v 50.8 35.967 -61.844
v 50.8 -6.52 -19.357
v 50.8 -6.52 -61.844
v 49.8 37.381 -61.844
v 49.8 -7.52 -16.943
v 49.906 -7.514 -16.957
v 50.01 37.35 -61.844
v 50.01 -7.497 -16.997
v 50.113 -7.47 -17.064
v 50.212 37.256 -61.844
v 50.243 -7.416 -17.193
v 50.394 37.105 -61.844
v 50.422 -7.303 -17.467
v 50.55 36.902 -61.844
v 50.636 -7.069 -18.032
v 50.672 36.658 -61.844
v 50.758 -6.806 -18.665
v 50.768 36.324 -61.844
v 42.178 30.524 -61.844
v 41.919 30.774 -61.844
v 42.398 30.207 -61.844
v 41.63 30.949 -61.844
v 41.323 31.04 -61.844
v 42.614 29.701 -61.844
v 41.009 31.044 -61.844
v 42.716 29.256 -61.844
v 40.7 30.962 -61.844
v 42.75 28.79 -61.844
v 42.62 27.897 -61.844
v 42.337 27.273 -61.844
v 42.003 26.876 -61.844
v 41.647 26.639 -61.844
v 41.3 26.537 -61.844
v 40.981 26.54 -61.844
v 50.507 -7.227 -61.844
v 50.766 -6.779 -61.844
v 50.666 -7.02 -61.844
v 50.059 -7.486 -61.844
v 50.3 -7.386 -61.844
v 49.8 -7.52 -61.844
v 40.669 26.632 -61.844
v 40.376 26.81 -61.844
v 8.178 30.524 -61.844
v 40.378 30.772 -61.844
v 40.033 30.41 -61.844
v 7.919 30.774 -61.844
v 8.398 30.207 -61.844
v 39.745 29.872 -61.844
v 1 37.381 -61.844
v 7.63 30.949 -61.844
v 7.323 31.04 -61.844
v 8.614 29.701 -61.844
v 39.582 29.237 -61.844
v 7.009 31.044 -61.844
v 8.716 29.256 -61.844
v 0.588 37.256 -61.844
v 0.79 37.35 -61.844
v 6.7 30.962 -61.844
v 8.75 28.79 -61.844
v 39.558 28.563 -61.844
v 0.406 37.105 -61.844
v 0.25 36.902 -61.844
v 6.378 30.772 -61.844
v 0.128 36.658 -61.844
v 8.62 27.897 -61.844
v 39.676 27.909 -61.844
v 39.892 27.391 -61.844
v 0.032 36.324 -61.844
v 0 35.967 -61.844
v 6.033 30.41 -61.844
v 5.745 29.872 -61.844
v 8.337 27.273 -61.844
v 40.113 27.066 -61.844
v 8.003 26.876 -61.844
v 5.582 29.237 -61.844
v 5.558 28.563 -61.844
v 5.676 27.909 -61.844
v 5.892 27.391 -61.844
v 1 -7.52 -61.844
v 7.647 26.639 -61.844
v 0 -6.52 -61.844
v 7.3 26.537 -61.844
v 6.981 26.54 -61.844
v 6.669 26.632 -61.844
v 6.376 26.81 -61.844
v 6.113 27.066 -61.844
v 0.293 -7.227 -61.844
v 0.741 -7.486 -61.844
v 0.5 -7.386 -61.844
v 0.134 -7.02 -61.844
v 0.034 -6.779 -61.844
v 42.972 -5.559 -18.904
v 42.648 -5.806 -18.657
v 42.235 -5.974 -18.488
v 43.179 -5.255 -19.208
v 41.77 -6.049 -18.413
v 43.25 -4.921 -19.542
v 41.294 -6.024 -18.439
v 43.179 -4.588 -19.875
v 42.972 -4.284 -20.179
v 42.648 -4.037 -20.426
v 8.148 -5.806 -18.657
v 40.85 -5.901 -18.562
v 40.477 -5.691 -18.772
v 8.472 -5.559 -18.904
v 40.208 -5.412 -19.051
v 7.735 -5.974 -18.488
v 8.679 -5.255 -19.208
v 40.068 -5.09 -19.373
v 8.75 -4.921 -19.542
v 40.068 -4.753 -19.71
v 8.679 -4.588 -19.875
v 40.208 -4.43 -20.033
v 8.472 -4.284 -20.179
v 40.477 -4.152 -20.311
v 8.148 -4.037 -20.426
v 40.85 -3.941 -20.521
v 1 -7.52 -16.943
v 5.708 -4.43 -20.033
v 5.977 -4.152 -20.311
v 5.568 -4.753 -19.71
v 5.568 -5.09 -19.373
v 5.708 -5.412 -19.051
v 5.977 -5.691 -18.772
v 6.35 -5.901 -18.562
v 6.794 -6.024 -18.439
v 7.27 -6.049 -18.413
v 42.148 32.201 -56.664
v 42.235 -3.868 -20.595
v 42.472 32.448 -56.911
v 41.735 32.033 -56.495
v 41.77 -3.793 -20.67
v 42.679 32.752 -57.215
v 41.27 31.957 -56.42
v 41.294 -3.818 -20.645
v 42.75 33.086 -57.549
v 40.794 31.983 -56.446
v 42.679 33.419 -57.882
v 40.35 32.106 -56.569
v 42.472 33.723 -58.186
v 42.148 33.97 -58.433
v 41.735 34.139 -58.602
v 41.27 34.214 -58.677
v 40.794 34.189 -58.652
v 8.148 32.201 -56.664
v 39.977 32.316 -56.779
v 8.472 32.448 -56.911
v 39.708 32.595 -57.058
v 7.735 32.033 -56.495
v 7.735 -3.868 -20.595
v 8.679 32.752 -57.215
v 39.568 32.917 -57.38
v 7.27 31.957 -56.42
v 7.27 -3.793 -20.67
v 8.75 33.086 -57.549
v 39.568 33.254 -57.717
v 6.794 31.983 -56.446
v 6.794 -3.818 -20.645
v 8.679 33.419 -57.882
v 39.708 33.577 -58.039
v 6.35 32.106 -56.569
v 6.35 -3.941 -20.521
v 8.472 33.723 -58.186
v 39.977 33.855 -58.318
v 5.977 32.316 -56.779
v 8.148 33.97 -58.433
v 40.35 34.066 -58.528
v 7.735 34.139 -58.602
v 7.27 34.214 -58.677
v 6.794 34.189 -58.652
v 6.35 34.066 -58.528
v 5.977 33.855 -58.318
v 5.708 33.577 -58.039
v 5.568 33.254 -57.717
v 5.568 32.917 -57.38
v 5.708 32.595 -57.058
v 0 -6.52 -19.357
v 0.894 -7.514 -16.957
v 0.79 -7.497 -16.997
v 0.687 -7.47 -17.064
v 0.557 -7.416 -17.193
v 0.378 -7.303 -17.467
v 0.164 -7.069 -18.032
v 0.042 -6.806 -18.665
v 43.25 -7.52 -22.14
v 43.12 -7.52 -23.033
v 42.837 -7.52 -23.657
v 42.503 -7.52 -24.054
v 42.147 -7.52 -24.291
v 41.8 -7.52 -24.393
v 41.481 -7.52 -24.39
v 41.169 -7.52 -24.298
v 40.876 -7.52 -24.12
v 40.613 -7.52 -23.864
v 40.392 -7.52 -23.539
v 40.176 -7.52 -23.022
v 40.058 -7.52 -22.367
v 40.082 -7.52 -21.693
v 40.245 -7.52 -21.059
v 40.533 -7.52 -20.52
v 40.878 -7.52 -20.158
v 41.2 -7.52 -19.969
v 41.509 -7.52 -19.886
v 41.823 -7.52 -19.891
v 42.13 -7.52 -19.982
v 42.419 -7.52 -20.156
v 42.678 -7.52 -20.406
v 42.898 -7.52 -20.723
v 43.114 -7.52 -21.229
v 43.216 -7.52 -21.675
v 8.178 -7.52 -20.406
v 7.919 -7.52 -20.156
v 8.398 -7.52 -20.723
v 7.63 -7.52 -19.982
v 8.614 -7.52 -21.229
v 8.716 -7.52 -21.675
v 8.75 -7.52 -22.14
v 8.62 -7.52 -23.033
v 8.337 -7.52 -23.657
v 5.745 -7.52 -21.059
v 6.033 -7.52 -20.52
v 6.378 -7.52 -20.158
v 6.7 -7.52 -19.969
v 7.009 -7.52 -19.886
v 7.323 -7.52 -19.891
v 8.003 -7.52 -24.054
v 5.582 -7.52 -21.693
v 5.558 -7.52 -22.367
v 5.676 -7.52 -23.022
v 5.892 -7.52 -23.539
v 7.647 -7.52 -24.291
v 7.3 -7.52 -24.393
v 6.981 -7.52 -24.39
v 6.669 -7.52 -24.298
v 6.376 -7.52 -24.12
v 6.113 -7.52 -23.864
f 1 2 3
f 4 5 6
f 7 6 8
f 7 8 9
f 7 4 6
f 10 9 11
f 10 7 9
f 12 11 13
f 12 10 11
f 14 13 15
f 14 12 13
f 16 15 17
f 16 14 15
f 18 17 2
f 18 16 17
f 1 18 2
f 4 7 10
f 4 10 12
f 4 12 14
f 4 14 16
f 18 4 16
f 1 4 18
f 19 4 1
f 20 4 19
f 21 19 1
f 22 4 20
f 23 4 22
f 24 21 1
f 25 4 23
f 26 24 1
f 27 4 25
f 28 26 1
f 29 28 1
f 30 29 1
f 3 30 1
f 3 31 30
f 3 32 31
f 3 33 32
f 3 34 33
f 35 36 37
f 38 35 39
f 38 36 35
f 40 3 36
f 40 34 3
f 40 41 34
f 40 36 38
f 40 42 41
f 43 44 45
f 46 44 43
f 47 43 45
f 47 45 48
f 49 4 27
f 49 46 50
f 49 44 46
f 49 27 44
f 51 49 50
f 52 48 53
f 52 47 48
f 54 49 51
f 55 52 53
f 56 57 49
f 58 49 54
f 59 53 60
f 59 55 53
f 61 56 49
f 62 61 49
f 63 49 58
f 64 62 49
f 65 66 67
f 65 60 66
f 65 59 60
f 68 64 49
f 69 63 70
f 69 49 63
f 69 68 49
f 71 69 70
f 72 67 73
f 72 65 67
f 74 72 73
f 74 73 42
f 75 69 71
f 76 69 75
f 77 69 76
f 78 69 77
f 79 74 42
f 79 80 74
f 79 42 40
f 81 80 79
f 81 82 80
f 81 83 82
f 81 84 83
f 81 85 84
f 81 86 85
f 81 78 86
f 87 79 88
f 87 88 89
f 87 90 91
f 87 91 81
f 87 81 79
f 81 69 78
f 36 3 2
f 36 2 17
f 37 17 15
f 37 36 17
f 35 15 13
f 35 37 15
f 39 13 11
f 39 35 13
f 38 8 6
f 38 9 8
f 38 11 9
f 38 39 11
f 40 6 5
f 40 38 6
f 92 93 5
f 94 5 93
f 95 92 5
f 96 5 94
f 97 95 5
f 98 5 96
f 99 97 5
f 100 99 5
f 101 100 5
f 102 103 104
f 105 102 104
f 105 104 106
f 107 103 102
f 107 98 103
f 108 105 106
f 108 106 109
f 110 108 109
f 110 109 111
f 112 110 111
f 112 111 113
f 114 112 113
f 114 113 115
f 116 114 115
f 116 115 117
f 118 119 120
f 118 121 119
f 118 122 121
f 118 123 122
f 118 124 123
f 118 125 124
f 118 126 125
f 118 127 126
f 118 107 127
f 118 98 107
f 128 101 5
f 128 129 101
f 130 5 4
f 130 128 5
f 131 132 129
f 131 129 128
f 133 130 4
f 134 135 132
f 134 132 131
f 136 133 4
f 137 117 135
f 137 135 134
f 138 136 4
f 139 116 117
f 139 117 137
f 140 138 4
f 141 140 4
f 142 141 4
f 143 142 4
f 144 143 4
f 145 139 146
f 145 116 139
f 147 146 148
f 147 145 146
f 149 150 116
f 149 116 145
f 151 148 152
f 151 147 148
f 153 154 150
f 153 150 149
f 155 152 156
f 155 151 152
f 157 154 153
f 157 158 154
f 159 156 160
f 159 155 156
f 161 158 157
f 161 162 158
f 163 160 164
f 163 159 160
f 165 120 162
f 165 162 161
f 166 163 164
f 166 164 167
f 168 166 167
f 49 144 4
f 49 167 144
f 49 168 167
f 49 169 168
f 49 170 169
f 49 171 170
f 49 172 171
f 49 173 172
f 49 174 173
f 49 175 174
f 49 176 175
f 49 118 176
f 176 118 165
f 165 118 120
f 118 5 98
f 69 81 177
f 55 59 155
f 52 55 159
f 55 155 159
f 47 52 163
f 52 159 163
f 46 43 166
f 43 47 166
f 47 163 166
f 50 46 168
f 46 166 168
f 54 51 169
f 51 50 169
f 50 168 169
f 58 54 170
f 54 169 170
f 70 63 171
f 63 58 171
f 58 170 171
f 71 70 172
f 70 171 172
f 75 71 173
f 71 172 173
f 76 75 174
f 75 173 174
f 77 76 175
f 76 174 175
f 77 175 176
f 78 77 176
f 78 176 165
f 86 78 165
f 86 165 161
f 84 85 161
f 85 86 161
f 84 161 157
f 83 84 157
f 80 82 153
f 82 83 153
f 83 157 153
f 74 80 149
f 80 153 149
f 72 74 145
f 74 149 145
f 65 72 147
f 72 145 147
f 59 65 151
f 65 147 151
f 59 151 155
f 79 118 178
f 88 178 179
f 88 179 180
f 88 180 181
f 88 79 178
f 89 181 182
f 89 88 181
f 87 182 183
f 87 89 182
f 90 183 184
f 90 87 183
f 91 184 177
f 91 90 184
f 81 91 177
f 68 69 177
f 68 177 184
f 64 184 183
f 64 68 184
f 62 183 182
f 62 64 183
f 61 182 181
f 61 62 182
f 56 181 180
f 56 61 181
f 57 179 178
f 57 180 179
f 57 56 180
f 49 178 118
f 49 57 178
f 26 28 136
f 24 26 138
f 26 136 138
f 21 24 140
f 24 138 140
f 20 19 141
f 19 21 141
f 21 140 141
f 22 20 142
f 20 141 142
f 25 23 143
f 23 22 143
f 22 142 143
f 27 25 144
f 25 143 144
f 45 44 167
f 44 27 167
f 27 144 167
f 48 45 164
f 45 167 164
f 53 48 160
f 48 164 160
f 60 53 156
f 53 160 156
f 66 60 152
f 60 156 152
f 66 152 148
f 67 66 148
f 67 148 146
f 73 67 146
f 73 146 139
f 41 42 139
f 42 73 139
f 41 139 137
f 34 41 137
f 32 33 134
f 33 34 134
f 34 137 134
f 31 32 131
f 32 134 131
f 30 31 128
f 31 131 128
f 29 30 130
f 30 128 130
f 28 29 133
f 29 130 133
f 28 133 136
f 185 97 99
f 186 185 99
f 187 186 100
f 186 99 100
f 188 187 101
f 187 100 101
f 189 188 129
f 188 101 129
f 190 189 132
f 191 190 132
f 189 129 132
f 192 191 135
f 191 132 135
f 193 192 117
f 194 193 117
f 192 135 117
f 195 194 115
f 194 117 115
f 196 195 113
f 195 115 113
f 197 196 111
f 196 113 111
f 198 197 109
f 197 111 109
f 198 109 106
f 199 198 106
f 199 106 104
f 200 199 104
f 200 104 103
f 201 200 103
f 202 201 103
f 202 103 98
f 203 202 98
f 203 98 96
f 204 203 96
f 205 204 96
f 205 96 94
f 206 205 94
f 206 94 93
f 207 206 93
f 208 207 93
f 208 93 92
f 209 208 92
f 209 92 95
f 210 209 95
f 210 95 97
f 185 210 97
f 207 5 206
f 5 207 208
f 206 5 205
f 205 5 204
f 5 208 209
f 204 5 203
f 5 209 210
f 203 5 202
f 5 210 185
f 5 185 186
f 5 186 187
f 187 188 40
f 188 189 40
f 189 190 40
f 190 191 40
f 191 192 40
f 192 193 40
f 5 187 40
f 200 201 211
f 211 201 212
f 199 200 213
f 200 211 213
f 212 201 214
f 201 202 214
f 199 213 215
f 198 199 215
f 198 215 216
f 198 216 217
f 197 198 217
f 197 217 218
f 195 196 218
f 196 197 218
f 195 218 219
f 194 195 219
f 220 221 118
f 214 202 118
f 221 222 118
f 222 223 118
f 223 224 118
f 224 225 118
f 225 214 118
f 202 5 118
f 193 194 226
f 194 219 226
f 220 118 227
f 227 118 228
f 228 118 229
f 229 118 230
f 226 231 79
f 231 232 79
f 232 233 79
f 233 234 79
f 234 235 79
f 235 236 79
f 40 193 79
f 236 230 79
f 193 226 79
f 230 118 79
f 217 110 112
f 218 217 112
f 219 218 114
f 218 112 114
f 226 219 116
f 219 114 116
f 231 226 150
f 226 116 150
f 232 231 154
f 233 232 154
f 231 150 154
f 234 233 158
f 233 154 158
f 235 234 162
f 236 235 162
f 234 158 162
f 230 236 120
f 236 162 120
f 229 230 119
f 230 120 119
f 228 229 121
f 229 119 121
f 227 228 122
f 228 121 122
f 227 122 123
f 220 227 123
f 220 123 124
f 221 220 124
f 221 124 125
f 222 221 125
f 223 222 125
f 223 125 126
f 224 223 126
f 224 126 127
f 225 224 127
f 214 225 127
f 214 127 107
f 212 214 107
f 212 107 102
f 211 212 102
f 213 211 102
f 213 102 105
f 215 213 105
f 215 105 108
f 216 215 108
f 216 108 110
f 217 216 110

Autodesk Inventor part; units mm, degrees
ref_plane "YZ Plane" through (0, 0, 0) normal (1, 0, 0) x (0, 1, 0)
ref_plane "XZ Plane" through (0, 0, 0) normal (0, 1, 0) x (-1, 0, 0)
ref_plane "XY Plane" through (0, 0, 0) normal (0, 0, 1) x (1, 0, 0)
sketch "Sketch2" plane through (0, 0, 0) normal (1, 0, 0) x (0, 1, 0)
  line L0 (-7.5199, -16.943) -> (37.3814, -61.8443)
  line L1 (37.3814, -61.8443) -> (-7.5199, -61.8443)
  line L2 (-7.5199, -16.943) -> (-7.5199, -61.8443)
  point P0 (0, 0)
  dimension "d0" = 63.5
  dimension "d3" = 45
extrude "Extrusion1" add sketch "Sketch2" along normal blind 50.8
sketch "Sketch4" plane through (0, -7.5199, -16.943) normal (0, 0.7071, 0.7071) x (1, 0, 0)
  circle A0 centre (41.65, 3.675) radius 1.6 projected
  circle A1 centre (41.15, 57.425) radius 1.6 projected
  circle A2 centre (7.15, 57.425) radius 1.6 projected
  circle A3 centre (7.15, 3.675) radius 1.6 projected
  point P0 (0, -6.6631)
extrude "Extrusion3" cut sketch "Sketch4" against normal through all
fillet "Fillet1" radius 1 4 edges at (50.8, -7.5199, -39.3936) (50.8, 14.9307, -39.3936) (0, 14.9307, -39.3936) (0, -7.5199, -39.3936)
